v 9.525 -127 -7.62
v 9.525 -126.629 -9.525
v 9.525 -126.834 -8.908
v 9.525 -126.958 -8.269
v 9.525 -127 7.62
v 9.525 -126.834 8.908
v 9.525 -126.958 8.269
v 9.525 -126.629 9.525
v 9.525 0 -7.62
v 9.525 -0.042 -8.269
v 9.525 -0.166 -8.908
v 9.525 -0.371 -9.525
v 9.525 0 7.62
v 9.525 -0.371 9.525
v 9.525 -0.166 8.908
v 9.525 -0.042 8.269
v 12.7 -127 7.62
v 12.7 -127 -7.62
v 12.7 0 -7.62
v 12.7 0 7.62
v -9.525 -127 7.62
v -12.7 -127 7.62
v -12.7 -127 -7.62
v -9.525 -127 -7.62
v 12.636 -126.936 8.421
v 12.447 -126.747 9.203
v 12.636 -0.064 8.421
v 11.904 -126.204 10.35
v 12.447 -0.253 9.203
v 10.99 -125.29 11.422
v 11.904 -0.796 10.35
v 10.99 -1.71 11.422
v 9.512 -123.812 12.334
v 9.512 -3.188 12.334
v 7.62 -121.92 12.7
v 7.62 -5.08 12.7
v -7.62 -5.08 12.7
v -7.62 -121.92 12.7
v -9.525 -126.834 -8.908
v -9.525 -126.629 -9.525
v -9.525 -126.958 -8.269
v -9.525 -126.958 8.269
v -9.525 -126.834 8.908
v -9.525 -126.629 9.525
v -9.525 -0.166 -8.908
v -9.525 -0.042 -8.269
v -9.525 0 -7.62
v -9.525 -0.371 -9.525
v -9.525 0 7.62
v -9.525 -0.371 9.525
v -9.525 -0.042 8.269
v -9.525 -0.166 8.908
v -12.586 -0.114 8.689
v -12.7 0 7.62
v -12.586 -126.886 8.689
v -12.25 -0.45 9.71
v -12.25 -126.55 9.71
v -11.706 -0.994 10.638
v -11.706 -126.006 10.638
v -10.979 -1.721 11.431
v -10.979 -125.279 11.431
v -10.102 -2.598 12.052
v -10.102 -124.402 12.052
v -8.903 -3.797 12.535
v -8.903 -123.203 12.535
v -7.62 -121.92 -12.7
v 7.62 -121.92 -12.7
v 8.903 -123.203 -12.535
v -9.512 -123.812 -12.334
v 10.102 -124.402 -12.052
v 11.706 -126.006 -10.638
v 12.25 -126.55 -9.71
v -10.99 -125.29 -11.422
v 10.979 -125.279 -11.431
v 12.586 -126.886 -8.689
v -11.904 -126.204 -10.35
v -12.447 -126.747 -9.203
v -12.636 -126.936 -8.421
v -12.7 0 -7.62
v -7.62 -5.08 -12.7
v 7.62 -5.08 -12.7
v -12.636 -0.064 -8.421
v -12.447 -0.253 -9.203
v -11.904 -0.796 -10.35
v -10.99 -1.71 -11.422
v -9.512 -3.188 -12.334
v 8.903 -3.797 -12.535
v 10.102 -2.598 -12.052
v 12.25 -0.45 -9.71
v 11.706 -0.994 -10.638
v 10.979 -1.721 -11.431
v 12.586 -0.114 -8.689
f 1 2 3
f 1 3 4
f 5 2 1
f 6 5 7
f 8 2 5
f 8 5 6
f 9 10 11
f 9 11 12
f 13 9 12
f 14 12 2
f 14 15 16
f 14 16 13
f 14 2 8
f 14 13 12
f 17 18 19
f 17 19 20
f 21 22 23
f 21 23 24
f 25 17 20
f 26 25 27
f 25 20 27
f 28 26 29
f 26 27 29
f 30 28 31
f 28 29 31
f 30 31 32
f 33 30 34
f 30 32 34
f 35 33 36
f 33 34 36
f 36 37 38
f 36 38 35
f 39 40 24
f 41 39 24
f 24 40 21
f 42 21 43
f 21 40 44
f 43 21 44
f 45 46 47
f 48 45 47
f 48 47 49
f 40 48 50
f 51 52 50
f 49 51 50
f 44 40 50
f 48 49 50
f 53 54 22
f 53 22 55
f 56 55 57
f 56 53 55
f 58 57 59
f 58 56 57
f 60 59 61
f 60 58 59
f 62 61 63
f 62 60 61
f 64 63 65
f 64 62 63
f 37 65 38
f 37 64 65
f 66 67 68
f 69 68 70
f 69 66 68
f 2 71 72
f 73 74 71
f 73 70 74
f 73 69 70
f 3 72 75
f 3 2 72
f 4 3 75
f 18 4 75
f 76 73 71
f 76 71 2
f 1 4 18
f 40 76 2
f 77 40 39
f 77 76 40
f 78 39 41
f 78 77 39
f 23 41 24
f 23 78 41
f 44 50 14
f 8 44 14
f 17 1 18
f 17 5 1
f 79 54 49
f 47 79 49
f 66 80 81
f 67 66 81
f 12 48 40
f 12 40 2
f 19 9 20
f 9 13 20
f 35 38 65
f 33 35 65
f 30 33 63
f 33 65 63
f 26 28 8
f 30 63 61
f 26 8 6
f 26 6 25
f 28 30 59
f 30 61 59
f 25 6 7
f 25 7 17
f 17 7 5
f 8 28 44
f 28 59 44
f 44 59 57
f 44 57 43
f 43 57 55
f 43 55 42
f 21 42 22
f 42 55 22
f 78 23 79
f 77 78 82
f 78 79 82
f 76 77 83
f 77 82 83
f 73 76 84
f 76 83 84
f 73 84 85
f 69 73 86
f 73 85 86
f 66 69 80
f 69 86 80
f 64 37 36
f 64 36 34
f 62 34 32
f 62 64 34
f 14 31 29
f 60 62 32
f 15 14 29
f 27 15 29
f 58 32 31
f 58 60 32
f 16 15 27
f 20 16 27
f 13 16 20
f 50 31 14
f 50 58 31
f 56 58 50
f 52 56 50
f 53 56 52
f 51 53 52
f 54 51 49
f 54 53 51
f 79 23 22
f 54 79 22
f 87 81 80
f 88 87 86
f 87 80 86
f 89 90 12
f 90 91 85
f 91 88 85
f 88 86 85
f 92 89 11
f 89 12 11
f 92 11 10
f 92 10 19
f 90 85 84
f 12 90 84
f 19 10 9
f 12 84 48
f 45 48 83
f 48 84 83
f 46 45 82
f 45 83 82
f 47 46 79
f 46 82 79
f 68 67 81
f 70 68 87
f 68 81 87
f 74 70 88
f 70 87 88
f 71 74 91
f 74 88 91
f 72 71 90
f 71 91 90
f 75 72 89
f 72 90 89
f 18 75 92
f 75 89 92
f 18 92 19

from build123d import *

# Parameters (mm, degrees)
F0_W        = 25.4
F0_H        = 25.4
F0_W_2      = 19.05
F0_H_2      = 19.05
F1_DEPTH    = 127
F2_T1_DEPTH = 152.4
F2_T3_DEPTH = 50.8


# Not quite as in the source:
# - a fillet or chamfer that OpenCascade refuses, or shapes differently, is made with other operations: its cross-section is extruded or revolved along the edge and cut away or added


with BuildPart() as f1:
    # F0 (on Front) → F1 (new body)
    with BuildSketch(Plane.XZ):
        Rectangle(F0_W, F0_H)
        Rectangle(F0_W_2, F0_H_2, mode=Mode.SUBTRACT)
    extrude(amount=F1_DEPTH)

    # F2: fillet of radius 5.08 on 8 edges, made by hand

    # F2_s2 → F2_t1 (cut)
    with BuildSketch(Plane.XZ.offset(-12.7)):
        with BuildLine():
            ThreePointArc((12.7, 7.62), (11.2121024484, 11.2121024484), (7.62, 12.7))
            Line((7.62, 12.7), (12.7, 12.7))
            Line((12.7, 12.7), (12.7, 7.62))
        make_face()
        with BuildLine():
            ThreePointArc((-12.7, 7.62), (-11.2121024484, 11.2121024484), (-7.62, 12.7))
            Line((-7.62, 12.7), (-12.7, 12.7))
            Line((-12.7, 12.7), (-12.7, 7.62))
        make_face()
        with BuildLine():
            ThreePointArc((-12.7, -7.62), (-11.2121024484, -11.2121024484), (-7.62, -12.7))
            Line((-7.62, -12.7), (-12.7, -12.7))
            Line((-12.7, -12.7), (-12.7, -7.62))
        make_face()
        with BuildLine():
            ThreePointArc((7.62, -12.7), (11.2121024484, -11.2121024484), (12.7, -7.62))
            Line((12.7, -7.62), (12.7, -12.7))
            Line((12.7, -12.7), (7.62, -12.7))
        make_face()
    extrude(amount=F2_T1_DEPTH, mode=Mode.SUBTRACT)

    # F2_s4 → F2_t3 (cut)
    with BuildSketch(Plane.YZ.offset(-25.4)):
        with BuildLine():
            ThreePointArc((-5.08, 12.7), (-1.4878975516, 11.2121024484), (0, 7.62))
            Line((0, 7.62), (0, 12.7))
            Line((0, 12.7), (-5.08, 12.7))
        make_face()
        with BuildLine():
            ThreePointArc((-121.92, 12.7), (-125.5121024484, 11.2121024484), (-127, 7.62))
            Line((-127, 7.62), (-127, 12.7))
            Line((-127, 12.7), (-121.92, 12.7))
        make_face()
        with BuildLine():
            ThreePointArc((-5.08, -12.7), (-1.4878975516, -11.2121024484), (0, -7.62))
            Line((0, -7.62), (0, -12.7))
            Line((0, -12.7), (-5.08, -12.7))
        make_face()
        with BuildLine():
            ThreePointArc((-121.92, -12.7), (-125.5121024484, -11.2121024484), (-127, -7.62))
            Line((-127, -7.62), (-127, -12.7))
            Line((-127, -12.7), (-121.92, -12.7))
        make_face()
    extrude(amount=F2_T3_DEPTH, mode=Mode.SUBTRACT)


solid = f1.part
